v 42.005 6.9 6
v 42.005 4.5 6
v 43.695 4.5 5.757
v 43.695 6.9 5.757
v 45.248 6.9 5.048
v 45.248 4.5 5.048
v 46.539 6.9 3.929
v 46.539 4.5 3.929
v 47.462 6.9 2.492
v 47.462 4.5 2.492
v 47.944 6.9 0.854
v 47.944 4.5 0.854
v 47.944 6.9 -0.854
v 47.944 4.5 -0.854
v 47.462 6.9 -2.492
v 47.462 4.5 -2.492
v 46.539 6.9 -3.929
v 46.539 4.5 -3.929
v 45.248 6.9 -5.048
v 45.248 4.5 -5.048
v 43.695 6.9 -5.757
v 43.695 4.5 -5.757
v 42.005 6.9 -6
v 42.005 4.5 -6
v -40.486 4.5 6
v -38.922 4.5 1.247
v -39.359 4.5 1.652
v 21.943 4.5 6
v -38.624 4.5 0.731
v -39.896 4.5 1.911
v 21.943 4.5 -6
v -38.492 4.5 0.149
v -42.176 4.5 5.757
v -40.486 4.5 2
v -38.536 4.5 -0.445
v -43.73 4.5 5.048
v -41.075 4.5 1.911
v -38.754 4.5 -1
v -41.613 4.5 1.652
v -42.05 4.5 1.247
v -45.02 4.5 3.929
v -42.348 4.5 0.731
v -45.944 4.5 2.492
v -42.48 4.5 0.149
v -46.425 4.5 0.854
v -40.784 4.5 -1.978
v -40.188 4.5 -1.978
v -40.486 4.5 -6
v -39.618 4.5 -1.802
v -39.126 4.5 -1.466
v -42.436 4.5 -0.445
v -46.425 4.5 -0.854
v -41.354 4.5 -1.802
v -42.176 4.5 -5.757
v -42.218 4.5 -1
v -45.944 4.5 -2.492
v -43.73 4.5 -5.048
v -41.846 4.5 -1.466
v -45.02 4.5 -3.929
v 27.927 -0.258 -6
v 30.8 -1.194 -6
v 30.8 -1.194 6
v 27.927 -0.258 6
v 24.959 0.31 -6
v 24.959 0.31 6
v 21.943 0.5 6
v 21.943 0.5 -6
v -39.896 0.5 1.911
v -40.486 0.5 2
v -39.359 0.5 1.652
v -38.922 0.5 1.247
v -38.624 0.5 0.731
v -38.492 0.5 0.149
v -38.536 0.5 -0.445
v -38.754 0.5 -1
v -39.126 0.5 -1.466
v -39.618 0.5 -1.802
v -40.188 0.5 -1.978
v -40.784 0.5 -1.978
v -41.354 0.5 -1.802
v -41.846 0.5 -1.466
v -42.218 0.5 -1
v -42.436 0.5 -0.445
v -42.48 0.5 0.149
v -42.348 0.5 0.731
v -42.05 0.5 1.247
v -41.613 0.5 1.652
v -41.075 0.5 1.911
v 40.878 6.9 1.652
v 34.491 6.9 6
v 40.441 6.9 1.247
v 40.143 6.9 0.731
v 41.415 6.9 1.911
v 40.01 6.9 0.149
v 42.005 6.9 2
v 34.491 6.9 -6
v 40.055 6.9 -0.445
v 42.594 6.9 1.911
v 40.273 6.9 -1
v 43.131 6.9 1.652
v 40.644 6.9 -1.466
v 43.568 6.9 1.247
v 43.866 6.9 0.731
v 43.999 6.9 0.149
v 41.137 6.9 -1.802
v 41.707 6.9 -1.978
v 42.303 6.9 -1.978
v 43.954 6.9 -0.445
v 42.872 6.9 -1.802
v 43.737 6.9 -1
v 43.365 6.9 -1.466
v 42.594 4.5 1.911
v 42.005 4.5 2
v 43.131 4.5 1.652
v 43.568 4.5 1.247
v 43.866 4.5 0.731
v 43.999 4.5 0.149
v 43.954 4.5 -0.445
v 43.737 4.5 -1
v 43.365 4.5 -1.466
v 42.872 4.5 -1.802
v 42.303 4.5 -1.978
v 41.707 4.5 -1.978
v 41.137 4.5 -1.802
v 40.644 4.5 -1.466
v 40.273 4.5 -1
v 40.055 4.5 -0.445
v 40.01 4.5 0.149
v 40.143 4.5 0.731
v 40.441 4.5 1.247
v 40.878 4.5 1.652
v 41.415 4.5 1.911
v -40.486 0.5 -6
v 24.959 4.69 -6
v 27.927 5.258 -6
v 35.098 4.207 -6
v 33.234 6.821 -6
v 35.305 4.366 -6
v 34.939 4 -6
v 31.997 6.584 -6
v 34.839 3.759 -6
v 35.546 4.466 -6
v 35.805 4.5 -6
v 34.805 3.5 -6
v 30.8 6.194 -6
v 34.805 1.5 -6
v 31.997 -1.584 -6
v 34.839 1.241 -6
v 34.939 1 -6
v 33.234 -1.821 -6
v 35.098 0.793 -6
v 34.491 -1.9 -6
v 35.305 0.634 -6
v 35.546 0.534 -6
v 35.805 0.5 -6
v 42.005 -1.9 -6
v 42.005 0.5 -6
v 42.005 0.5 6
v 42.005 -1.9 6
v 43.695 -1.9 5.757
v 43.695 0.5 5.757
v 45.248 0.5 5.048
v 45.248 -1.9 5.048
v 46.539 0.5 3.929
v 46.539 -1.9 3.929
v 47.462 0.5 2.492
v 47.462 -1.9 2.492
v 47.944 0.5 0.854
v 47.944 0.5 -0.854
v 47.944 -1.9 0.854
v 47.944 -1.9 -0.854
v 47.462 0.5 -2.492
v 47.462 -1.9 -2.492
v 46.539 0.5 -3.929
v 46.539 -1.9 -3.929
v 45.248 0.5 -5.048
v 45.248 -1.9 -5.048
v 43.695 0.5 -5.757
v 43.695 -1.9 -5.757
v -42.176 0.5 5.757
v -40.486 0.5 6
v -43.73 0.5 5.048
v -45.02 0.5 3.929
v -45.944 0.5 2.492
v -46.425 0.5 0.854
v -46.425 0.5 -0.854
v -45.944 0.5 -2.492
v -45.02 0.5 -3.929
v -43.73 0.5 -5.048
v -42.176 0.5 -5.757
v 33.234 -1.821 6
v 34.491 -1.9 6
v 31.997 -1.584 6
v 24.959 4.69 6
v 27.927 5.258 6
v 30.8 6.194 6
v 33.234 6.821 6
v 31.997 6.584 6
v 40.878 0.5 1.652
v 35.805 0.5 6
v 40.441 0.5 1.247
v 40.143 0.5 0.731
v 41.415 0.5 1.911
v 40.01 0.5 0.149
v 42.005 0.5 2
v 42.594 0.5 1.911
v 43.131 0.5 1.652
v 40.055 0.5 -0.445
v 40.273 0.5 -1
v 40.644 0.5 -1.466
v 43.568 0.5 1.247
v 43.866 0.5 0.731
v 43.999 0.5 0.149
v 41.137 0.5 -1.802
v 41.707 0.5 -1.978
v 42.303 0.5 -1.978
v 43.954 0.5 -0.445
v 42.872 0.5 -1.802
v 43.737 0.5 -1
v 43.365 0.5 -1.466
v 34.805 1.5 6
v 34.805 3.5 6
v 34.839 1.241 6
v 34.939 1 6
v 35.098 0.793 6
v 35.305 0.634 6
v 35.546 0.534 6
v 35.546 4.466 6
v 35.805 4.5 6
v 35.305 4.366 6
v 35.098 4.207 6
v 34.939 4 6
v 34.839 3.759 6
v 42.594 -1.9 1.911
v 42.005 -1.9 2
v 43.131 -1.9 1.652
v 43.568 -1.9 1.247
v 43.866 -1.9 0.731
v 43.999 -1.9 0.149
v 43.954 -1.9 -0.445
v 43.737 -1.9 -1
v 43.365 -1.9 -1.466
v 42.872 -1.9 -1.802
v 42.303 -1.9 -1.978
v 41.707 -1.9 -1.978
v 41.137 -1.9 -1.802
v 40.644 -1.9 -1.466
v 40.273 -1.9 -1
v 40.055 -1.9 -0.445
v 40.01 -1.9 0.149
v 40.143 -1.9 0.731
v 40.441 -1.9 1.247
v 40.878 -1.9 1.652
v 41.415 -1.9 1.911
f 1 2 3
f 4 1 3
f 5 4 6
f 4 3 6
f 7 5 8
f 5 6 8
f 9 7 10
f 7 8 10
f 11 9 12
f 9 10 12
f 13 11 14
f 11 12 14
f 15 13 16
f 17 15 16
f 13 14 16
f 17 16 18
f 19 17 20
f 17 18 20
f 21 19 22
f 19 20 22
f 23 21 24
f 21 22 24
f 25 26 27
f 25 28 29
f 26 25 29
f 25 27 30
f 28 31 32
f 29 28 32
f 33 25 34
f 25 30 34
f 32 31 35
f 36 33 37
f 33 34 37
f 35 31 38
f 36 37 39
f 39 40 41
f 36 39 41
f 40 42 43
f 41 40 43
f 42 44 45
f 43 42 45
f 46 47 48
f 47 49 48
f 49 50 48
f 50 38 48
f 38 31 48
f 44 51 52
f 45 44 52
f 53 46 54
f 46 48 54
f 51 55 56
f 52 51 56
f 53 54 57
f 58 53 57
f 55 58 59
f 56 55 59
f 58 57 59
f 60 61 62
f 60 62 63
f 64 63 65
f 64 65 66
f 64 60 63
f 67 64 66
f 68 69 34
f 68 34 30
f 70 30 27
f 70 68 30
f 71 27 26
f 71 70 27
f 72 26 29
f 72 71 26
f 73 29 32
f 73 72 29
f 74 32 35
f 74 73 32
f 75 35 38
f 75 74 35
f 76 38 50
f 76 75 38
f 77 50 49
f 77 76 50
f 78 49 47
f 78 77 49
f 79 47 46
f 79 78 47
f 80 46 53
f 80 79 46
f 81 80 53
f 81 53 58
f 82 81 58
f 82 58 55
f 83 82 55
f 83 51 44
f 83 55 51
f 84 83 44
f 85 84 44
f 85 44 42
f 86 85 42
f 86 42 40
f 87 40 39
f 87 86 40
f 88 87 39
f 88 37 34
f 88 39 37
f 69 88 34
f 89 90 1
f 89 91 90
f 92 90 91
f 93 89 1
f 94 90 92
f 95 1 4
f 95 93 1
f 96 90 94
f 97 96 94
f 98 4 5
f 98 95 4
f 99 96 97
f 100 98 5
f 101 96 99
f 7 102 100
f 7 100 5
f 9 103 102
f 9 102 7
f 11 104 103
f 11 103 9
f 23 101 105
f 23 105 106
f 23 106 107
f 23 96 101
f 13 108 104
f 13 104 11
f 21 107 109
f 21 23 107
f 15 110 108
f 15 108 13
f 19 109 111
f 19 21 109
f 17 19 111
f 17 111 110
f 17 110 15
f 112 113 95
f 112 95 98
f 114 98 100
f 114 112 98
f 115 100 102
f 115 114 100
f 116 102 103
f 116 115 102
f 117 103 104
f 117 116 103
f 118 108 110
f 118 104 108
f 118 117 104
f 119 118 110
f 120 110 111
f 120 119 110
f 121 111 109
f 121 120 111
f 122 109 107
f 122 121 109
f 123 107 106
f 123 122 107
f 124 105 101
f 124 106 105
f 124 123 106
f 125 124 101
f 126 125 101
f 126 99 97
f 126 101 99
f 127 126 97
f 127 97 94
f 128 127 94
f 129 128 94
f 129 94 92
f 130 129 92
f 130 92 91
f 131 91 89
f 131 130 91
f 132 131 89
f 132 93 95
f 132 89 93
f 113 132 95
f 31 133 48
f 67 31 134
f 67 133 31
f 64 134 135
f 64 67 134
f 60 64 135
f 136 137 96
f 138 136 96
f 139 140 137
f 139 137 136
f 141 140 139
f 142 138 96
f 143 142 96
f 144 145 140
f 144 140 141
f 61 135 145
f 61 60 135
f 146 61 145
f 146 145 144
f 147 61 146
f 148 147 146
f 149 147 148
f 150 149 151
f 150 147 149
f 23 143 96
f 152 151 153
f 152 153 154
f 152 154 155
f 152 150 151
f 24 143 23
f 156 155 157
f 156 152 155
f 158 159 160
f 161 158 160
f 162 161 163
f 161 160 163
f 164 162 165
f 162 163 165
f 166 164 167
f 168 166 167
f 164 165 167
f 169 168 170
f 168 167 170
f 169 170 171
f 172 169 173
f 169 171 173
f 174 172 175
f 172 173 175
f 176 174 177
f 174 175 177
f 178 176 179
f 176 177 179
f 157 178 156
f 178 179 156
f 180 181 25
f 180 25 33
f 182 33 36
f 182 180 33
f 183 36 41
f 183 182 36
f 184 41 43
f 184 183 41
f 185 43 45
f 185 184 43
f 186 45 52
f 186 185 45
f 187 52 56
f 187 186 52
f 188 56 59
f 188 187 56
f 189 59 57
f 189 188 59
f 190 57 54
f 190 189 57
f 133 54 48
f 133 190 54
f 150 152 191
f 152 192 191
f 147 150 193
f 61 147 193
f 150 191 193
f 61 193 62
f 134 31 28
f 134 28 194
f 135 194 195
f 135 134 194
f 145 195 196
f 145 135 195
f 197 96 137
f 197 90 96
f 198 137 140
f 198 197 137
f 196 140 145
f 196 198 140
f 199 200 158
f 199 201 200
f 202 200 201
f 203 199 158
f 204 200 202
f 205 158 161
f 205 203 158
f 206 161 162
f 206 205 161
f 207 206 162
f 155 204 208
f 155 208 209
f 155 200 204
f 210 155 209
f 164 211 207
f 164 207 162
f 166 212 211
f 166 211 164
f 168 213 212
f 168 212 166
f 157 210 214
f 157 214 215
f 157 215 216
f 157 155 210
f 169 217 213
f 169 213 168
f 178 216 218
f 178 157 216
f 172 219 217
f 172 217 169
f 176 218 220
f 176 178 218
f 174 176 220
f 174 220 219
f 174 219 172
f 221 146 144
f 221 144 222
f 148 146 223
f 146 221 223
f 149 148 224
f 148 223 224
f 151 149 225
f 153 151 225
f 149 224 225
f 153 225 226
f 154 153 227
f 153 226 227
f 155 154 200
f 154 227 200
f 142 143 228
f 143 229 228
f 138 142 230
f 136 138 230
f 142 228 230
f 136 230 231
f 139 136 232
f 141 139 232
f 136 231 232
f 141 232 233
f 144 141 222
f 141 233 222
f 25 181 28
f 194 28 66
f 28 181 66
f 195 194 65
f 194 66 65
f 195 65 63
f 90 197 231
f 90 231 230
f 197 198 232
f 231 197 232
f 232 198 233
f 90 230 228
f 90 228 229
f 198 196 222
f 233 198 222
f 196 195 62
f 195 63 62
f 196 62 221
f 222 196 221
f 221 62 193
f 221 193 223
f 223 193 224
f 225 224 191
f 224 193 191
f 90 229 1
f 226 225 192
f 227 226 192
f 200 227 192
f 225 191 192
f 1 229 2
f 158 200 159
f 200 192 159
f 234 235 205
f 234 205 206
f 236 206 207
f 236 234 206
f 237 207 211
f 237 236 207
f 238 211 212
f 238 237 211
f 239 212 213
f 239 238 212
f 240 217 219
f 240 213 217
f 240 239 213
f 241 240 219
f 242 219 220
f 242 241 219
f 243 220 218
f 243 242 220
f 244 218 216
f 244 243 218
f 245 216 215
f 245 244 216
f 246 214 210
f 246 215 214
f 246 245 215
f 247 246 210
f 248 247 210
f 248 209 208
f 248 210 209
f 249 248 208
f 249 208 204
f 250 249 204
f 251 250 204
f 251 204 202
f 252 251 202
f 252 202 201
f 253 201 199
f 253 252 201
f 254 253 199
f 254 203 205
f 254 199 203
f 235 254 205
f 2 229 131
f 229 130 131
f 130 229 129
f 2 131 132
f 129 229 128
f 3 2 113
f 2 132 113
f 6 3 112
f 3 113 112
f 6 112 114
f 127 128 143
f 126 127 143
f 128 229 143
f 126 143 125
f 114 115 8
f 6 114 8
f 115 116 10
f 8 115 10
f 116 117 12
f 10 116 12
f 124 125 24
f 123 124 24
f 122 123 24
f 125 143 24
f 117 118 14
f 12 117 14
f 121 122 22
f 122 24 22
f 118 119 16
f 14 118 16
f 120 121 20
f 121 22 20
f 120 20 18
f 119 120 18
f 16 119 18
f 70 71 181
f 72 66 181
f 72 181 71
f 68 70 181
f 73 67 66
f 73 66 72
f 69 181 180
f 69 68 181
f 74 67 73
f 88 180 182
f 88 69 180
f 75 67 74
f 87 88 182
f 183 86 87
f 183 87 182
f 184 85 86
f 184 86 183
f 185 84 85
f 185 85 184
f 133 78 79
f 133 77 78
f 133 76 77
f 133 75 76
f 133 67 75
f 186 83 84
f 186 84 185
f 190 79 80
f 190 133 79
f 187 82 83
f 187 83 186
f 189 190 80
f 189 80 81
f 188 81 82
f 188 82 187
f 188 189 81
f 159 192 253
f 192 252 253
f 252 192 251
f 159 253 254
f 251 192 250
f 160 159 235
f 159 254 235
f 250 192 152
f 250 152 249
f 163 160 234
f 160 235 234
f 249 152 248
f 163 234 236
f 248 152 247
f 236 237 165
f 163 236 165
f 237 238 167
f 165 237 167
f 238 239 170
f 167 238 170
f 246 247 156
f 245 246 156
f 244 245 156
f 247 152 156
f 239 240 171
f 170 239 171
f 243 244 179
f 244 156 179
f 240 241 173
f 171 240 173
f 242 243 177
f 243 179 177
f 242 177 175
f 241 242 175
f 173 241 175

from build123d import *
from build123d.topology import SkipClean

# Parameters (mm, degrees)
SKETCH1_R                = 2.4
BOSS_EXTRUDE1_DEPTH      = 5
BOSS_EXTRUDE2_DEPTH      = 3
BOSS_EXTRUDE2_DEPTH_BACK = 8
SKETCH3_R                = 2.4
CUT_EXTRUDE1_DEPTH       = 2.5
CUT_EXTRUDE1_DEPTH_BACK  = 2.5
SKETCH4_R                = 2.4
FILLET1_R                = 30
SCALE1_SCALE             = 0.8
CUT_EXTRUDE2_DEPTH       = 49.577813504
CUT_EXTRUDE2_DEPTH_BACK  = 49.577813504
SKETCH5_R                = 2
FILLET2_R                = 1
FILLET3_R                = 10


with BuildPart() as part:
    # Sketch1 → Boss-Extrude1 (new body)
    with BuildSketch(Plane(origin=(0, 0, 0), x_dir=(1, 0, 0), z_dir=(0, 1, 0))):
        with BuildLine():
            Line((-51.5565916, 7.5), (51.5565916, 7.5))
            ThreePointArc((51.5565916, 7.5), (59.0565916, 0), (51.5565916, -7.5))
            Line((51.5565916, -7.5), (-51.5565916, -7.5))
            ThreePointArc((-51.5565916, -7.5), (-59.0565916, 0), (-51.5565916, 7.5))
        make_face()
        with Locations(Location((-51.5565916, 0, 0), (0, 0, 270))):
            Circle(SKETCH1_R, mode=Mode.SUBTRACT)
        with Locations(Location((51.5565916, 0, 0), (0, 0, 270))):
            Circle(SKETCH1_R, mode=Mode.SUBTRACT)
    extrude(amount=BOSS_EXTRUDE1_DEPTH)

    # Sketch3 → Boss-Extrude2 (add, two sides: drawn at the far end of the back side and taken through both)
    with SkipClean():  # the faces are left unmerged after this step: merging them gives an invalid solid
        with BuildSketch(Plane(origin=(0, 5, 0), x_dir=(1, 0, 0), z_dir=(0, 1, 0)).offset(-BOSS_EXTRUDE2_DEPTH_BACK)):
            with BuildLine():
                Line((51.5565916, 7.5), (39.5565916, 7.5))
                Line((39.5565916, 7.5), (39.5565916, -7.5))
                Line((39.5565916, -7.5), (51.5565916, -7.5))
                ThreePointArc((51.5565916, -7.5), (59.0565916, 0), (51.5565916, 7.5))
            make_face()
            with Locations(Location((51.5565916, 0, 0), (0, 0, 270))):
                Circle(SKETCH3_R, mode=Mode.SUBTRACT)
        extrude(amount=BOSS_EXTRUDE2_DEPTH + BOSS_EXTRUDE2_DEPTH_BACK)
    add(part.part.scale(1), mode=Mode.REPLACE)  # the faces are merged on a copy

    # Sketch4 → Cut-Extrude1 (cut, two sides: drawn at the far end of the back side and taken through both)
    with BuildSketch(Plane(origin=(0, 2.5, 0), x_dir=(1, 0, 0), z_dir=(0, 1, 0)).offset(-CUT_EXTRUDE1_DEPTH_BACK)):
        with BuildLine():
            Line((42.5565916, 7.5), (42.5565916, -7.5))
            Line((42.5565916, -7.5), (51.5565916, -7.5))
            ThreePointArc((51.5565916, -7.5), (59.0565916, 0), (51.5565916, 7.5))
            Line((51.5565916, 7.5), (42.5565916, 7.5))
        make_face()
        with Locations(Location((51.5565916, 0, 0), (0, 0, 270))):
            Circle(SKETCH4_R, mode=Mode.SUBTRACT)
    extrude(amount=CUT_EXTRUDE1_DEPTH + CUT_EXTRUDE1_DEPTH_BACK, mode=Mode.SUBTRACT)

    # Fillet1
    # the kernel refuses this fillet: 30 mm, written as the material it adds along each edge
    with BuildSketch(Plane(origin=(39.5565916, 0, -7.5), x_dir=(0, -1, 0), z_dir=(0, 0, 1))) as fillet1_piece_1:
        with BuildLine():
            CenterArc((30, -13.076696831), FILLET1_R, 154.158067237, 25.841932763)
            Line((0, -13.076696831), (-0.6, -13.076696831))
            Line((-0.6, -13.076696831), (-0.6, 0))
            Line((-0.6, 0), (0, 0.6))
            ThreePointArc((0, 0.6), (1.5, 0.6), (2.46, 0.261533937))
            Line((2.46, 0.261533937), (3, 0))
        make_face()
    extrude(amount=15)
    with BuildSketch(Plane(origin=(39.5565916, 5, -7.5), x_dir=(-1, 0, 0), z_dir=(0, 0, 1))) as fillet1_piece_2:
        with BuildLine():
            CenterArc((13.076696831, -30), FILLET1_R, 90, 25.841932763)
            Line((0, -3), (-0.261533937, -2.46))
            ThreePointArc((-0.261533937, -2.46), (-0.6, -1.5), (-0.6, 0))
            Line((-0.6, 0), (0, 0.6))
            Line((0, 0.6), (13.076696831, 0.6))
            Line((13.076696831, 0.6), (13.076696831, 0))
        make_face()
    extrude(amount=15)


with BuildPart() as part_1:
    # Scale1: scaled about (3.796755654, 2.5, 0)
    add(part.part.scale(SCALE1_SCALE).moved(Location((0.759351131, 0.5, 0))))

    # Sketch5 → Cut-Extrude2 (cut, two sides: drawn at the far end of the back side and taken through both)
    with BuildSketch(Plane(origin=(0, 2.5, 0), x_dir=(1, 0, 0), z_dir=(0, 1, 0)).offset(-CUT_EXTRUDE2_DEPTH_BACK)):
        with Locations(Location((-40.485922149, 0, 0), (0, 0, 270))):
            Circle(SKETCH5_R)
        with Locations(Location((42.004624411, 0, 0), (0, 0, 270))):
            Circle(SKETCH5_R)
    extrude(amount=CUT_EXTRUDE2_DEPTH + CUT_EXTRUDE2_DEPTH_BACK, mode=Mode.SUBTRACT)

    # Fillet2
    fillet2_edges = [part_1.edges().sort_by_distance(p)[0] for p in [
        (34.804624411, 4.5, 0),
        (34.804624411, 0.5, 0),
    ]]
    fillet(fillet2_edges, radius=FILLET2_R)

    # Fillet3
    fillet3_edges = [part_1.edges().sort_by_distance(p)[0] for p in [
        (32.404624411, -1.9, 0),
        (32.404624411, 6.9, 0),
    ]]
    fillet(fillet3_edges, radius=FILLET3_R)


solid = part_1.part
